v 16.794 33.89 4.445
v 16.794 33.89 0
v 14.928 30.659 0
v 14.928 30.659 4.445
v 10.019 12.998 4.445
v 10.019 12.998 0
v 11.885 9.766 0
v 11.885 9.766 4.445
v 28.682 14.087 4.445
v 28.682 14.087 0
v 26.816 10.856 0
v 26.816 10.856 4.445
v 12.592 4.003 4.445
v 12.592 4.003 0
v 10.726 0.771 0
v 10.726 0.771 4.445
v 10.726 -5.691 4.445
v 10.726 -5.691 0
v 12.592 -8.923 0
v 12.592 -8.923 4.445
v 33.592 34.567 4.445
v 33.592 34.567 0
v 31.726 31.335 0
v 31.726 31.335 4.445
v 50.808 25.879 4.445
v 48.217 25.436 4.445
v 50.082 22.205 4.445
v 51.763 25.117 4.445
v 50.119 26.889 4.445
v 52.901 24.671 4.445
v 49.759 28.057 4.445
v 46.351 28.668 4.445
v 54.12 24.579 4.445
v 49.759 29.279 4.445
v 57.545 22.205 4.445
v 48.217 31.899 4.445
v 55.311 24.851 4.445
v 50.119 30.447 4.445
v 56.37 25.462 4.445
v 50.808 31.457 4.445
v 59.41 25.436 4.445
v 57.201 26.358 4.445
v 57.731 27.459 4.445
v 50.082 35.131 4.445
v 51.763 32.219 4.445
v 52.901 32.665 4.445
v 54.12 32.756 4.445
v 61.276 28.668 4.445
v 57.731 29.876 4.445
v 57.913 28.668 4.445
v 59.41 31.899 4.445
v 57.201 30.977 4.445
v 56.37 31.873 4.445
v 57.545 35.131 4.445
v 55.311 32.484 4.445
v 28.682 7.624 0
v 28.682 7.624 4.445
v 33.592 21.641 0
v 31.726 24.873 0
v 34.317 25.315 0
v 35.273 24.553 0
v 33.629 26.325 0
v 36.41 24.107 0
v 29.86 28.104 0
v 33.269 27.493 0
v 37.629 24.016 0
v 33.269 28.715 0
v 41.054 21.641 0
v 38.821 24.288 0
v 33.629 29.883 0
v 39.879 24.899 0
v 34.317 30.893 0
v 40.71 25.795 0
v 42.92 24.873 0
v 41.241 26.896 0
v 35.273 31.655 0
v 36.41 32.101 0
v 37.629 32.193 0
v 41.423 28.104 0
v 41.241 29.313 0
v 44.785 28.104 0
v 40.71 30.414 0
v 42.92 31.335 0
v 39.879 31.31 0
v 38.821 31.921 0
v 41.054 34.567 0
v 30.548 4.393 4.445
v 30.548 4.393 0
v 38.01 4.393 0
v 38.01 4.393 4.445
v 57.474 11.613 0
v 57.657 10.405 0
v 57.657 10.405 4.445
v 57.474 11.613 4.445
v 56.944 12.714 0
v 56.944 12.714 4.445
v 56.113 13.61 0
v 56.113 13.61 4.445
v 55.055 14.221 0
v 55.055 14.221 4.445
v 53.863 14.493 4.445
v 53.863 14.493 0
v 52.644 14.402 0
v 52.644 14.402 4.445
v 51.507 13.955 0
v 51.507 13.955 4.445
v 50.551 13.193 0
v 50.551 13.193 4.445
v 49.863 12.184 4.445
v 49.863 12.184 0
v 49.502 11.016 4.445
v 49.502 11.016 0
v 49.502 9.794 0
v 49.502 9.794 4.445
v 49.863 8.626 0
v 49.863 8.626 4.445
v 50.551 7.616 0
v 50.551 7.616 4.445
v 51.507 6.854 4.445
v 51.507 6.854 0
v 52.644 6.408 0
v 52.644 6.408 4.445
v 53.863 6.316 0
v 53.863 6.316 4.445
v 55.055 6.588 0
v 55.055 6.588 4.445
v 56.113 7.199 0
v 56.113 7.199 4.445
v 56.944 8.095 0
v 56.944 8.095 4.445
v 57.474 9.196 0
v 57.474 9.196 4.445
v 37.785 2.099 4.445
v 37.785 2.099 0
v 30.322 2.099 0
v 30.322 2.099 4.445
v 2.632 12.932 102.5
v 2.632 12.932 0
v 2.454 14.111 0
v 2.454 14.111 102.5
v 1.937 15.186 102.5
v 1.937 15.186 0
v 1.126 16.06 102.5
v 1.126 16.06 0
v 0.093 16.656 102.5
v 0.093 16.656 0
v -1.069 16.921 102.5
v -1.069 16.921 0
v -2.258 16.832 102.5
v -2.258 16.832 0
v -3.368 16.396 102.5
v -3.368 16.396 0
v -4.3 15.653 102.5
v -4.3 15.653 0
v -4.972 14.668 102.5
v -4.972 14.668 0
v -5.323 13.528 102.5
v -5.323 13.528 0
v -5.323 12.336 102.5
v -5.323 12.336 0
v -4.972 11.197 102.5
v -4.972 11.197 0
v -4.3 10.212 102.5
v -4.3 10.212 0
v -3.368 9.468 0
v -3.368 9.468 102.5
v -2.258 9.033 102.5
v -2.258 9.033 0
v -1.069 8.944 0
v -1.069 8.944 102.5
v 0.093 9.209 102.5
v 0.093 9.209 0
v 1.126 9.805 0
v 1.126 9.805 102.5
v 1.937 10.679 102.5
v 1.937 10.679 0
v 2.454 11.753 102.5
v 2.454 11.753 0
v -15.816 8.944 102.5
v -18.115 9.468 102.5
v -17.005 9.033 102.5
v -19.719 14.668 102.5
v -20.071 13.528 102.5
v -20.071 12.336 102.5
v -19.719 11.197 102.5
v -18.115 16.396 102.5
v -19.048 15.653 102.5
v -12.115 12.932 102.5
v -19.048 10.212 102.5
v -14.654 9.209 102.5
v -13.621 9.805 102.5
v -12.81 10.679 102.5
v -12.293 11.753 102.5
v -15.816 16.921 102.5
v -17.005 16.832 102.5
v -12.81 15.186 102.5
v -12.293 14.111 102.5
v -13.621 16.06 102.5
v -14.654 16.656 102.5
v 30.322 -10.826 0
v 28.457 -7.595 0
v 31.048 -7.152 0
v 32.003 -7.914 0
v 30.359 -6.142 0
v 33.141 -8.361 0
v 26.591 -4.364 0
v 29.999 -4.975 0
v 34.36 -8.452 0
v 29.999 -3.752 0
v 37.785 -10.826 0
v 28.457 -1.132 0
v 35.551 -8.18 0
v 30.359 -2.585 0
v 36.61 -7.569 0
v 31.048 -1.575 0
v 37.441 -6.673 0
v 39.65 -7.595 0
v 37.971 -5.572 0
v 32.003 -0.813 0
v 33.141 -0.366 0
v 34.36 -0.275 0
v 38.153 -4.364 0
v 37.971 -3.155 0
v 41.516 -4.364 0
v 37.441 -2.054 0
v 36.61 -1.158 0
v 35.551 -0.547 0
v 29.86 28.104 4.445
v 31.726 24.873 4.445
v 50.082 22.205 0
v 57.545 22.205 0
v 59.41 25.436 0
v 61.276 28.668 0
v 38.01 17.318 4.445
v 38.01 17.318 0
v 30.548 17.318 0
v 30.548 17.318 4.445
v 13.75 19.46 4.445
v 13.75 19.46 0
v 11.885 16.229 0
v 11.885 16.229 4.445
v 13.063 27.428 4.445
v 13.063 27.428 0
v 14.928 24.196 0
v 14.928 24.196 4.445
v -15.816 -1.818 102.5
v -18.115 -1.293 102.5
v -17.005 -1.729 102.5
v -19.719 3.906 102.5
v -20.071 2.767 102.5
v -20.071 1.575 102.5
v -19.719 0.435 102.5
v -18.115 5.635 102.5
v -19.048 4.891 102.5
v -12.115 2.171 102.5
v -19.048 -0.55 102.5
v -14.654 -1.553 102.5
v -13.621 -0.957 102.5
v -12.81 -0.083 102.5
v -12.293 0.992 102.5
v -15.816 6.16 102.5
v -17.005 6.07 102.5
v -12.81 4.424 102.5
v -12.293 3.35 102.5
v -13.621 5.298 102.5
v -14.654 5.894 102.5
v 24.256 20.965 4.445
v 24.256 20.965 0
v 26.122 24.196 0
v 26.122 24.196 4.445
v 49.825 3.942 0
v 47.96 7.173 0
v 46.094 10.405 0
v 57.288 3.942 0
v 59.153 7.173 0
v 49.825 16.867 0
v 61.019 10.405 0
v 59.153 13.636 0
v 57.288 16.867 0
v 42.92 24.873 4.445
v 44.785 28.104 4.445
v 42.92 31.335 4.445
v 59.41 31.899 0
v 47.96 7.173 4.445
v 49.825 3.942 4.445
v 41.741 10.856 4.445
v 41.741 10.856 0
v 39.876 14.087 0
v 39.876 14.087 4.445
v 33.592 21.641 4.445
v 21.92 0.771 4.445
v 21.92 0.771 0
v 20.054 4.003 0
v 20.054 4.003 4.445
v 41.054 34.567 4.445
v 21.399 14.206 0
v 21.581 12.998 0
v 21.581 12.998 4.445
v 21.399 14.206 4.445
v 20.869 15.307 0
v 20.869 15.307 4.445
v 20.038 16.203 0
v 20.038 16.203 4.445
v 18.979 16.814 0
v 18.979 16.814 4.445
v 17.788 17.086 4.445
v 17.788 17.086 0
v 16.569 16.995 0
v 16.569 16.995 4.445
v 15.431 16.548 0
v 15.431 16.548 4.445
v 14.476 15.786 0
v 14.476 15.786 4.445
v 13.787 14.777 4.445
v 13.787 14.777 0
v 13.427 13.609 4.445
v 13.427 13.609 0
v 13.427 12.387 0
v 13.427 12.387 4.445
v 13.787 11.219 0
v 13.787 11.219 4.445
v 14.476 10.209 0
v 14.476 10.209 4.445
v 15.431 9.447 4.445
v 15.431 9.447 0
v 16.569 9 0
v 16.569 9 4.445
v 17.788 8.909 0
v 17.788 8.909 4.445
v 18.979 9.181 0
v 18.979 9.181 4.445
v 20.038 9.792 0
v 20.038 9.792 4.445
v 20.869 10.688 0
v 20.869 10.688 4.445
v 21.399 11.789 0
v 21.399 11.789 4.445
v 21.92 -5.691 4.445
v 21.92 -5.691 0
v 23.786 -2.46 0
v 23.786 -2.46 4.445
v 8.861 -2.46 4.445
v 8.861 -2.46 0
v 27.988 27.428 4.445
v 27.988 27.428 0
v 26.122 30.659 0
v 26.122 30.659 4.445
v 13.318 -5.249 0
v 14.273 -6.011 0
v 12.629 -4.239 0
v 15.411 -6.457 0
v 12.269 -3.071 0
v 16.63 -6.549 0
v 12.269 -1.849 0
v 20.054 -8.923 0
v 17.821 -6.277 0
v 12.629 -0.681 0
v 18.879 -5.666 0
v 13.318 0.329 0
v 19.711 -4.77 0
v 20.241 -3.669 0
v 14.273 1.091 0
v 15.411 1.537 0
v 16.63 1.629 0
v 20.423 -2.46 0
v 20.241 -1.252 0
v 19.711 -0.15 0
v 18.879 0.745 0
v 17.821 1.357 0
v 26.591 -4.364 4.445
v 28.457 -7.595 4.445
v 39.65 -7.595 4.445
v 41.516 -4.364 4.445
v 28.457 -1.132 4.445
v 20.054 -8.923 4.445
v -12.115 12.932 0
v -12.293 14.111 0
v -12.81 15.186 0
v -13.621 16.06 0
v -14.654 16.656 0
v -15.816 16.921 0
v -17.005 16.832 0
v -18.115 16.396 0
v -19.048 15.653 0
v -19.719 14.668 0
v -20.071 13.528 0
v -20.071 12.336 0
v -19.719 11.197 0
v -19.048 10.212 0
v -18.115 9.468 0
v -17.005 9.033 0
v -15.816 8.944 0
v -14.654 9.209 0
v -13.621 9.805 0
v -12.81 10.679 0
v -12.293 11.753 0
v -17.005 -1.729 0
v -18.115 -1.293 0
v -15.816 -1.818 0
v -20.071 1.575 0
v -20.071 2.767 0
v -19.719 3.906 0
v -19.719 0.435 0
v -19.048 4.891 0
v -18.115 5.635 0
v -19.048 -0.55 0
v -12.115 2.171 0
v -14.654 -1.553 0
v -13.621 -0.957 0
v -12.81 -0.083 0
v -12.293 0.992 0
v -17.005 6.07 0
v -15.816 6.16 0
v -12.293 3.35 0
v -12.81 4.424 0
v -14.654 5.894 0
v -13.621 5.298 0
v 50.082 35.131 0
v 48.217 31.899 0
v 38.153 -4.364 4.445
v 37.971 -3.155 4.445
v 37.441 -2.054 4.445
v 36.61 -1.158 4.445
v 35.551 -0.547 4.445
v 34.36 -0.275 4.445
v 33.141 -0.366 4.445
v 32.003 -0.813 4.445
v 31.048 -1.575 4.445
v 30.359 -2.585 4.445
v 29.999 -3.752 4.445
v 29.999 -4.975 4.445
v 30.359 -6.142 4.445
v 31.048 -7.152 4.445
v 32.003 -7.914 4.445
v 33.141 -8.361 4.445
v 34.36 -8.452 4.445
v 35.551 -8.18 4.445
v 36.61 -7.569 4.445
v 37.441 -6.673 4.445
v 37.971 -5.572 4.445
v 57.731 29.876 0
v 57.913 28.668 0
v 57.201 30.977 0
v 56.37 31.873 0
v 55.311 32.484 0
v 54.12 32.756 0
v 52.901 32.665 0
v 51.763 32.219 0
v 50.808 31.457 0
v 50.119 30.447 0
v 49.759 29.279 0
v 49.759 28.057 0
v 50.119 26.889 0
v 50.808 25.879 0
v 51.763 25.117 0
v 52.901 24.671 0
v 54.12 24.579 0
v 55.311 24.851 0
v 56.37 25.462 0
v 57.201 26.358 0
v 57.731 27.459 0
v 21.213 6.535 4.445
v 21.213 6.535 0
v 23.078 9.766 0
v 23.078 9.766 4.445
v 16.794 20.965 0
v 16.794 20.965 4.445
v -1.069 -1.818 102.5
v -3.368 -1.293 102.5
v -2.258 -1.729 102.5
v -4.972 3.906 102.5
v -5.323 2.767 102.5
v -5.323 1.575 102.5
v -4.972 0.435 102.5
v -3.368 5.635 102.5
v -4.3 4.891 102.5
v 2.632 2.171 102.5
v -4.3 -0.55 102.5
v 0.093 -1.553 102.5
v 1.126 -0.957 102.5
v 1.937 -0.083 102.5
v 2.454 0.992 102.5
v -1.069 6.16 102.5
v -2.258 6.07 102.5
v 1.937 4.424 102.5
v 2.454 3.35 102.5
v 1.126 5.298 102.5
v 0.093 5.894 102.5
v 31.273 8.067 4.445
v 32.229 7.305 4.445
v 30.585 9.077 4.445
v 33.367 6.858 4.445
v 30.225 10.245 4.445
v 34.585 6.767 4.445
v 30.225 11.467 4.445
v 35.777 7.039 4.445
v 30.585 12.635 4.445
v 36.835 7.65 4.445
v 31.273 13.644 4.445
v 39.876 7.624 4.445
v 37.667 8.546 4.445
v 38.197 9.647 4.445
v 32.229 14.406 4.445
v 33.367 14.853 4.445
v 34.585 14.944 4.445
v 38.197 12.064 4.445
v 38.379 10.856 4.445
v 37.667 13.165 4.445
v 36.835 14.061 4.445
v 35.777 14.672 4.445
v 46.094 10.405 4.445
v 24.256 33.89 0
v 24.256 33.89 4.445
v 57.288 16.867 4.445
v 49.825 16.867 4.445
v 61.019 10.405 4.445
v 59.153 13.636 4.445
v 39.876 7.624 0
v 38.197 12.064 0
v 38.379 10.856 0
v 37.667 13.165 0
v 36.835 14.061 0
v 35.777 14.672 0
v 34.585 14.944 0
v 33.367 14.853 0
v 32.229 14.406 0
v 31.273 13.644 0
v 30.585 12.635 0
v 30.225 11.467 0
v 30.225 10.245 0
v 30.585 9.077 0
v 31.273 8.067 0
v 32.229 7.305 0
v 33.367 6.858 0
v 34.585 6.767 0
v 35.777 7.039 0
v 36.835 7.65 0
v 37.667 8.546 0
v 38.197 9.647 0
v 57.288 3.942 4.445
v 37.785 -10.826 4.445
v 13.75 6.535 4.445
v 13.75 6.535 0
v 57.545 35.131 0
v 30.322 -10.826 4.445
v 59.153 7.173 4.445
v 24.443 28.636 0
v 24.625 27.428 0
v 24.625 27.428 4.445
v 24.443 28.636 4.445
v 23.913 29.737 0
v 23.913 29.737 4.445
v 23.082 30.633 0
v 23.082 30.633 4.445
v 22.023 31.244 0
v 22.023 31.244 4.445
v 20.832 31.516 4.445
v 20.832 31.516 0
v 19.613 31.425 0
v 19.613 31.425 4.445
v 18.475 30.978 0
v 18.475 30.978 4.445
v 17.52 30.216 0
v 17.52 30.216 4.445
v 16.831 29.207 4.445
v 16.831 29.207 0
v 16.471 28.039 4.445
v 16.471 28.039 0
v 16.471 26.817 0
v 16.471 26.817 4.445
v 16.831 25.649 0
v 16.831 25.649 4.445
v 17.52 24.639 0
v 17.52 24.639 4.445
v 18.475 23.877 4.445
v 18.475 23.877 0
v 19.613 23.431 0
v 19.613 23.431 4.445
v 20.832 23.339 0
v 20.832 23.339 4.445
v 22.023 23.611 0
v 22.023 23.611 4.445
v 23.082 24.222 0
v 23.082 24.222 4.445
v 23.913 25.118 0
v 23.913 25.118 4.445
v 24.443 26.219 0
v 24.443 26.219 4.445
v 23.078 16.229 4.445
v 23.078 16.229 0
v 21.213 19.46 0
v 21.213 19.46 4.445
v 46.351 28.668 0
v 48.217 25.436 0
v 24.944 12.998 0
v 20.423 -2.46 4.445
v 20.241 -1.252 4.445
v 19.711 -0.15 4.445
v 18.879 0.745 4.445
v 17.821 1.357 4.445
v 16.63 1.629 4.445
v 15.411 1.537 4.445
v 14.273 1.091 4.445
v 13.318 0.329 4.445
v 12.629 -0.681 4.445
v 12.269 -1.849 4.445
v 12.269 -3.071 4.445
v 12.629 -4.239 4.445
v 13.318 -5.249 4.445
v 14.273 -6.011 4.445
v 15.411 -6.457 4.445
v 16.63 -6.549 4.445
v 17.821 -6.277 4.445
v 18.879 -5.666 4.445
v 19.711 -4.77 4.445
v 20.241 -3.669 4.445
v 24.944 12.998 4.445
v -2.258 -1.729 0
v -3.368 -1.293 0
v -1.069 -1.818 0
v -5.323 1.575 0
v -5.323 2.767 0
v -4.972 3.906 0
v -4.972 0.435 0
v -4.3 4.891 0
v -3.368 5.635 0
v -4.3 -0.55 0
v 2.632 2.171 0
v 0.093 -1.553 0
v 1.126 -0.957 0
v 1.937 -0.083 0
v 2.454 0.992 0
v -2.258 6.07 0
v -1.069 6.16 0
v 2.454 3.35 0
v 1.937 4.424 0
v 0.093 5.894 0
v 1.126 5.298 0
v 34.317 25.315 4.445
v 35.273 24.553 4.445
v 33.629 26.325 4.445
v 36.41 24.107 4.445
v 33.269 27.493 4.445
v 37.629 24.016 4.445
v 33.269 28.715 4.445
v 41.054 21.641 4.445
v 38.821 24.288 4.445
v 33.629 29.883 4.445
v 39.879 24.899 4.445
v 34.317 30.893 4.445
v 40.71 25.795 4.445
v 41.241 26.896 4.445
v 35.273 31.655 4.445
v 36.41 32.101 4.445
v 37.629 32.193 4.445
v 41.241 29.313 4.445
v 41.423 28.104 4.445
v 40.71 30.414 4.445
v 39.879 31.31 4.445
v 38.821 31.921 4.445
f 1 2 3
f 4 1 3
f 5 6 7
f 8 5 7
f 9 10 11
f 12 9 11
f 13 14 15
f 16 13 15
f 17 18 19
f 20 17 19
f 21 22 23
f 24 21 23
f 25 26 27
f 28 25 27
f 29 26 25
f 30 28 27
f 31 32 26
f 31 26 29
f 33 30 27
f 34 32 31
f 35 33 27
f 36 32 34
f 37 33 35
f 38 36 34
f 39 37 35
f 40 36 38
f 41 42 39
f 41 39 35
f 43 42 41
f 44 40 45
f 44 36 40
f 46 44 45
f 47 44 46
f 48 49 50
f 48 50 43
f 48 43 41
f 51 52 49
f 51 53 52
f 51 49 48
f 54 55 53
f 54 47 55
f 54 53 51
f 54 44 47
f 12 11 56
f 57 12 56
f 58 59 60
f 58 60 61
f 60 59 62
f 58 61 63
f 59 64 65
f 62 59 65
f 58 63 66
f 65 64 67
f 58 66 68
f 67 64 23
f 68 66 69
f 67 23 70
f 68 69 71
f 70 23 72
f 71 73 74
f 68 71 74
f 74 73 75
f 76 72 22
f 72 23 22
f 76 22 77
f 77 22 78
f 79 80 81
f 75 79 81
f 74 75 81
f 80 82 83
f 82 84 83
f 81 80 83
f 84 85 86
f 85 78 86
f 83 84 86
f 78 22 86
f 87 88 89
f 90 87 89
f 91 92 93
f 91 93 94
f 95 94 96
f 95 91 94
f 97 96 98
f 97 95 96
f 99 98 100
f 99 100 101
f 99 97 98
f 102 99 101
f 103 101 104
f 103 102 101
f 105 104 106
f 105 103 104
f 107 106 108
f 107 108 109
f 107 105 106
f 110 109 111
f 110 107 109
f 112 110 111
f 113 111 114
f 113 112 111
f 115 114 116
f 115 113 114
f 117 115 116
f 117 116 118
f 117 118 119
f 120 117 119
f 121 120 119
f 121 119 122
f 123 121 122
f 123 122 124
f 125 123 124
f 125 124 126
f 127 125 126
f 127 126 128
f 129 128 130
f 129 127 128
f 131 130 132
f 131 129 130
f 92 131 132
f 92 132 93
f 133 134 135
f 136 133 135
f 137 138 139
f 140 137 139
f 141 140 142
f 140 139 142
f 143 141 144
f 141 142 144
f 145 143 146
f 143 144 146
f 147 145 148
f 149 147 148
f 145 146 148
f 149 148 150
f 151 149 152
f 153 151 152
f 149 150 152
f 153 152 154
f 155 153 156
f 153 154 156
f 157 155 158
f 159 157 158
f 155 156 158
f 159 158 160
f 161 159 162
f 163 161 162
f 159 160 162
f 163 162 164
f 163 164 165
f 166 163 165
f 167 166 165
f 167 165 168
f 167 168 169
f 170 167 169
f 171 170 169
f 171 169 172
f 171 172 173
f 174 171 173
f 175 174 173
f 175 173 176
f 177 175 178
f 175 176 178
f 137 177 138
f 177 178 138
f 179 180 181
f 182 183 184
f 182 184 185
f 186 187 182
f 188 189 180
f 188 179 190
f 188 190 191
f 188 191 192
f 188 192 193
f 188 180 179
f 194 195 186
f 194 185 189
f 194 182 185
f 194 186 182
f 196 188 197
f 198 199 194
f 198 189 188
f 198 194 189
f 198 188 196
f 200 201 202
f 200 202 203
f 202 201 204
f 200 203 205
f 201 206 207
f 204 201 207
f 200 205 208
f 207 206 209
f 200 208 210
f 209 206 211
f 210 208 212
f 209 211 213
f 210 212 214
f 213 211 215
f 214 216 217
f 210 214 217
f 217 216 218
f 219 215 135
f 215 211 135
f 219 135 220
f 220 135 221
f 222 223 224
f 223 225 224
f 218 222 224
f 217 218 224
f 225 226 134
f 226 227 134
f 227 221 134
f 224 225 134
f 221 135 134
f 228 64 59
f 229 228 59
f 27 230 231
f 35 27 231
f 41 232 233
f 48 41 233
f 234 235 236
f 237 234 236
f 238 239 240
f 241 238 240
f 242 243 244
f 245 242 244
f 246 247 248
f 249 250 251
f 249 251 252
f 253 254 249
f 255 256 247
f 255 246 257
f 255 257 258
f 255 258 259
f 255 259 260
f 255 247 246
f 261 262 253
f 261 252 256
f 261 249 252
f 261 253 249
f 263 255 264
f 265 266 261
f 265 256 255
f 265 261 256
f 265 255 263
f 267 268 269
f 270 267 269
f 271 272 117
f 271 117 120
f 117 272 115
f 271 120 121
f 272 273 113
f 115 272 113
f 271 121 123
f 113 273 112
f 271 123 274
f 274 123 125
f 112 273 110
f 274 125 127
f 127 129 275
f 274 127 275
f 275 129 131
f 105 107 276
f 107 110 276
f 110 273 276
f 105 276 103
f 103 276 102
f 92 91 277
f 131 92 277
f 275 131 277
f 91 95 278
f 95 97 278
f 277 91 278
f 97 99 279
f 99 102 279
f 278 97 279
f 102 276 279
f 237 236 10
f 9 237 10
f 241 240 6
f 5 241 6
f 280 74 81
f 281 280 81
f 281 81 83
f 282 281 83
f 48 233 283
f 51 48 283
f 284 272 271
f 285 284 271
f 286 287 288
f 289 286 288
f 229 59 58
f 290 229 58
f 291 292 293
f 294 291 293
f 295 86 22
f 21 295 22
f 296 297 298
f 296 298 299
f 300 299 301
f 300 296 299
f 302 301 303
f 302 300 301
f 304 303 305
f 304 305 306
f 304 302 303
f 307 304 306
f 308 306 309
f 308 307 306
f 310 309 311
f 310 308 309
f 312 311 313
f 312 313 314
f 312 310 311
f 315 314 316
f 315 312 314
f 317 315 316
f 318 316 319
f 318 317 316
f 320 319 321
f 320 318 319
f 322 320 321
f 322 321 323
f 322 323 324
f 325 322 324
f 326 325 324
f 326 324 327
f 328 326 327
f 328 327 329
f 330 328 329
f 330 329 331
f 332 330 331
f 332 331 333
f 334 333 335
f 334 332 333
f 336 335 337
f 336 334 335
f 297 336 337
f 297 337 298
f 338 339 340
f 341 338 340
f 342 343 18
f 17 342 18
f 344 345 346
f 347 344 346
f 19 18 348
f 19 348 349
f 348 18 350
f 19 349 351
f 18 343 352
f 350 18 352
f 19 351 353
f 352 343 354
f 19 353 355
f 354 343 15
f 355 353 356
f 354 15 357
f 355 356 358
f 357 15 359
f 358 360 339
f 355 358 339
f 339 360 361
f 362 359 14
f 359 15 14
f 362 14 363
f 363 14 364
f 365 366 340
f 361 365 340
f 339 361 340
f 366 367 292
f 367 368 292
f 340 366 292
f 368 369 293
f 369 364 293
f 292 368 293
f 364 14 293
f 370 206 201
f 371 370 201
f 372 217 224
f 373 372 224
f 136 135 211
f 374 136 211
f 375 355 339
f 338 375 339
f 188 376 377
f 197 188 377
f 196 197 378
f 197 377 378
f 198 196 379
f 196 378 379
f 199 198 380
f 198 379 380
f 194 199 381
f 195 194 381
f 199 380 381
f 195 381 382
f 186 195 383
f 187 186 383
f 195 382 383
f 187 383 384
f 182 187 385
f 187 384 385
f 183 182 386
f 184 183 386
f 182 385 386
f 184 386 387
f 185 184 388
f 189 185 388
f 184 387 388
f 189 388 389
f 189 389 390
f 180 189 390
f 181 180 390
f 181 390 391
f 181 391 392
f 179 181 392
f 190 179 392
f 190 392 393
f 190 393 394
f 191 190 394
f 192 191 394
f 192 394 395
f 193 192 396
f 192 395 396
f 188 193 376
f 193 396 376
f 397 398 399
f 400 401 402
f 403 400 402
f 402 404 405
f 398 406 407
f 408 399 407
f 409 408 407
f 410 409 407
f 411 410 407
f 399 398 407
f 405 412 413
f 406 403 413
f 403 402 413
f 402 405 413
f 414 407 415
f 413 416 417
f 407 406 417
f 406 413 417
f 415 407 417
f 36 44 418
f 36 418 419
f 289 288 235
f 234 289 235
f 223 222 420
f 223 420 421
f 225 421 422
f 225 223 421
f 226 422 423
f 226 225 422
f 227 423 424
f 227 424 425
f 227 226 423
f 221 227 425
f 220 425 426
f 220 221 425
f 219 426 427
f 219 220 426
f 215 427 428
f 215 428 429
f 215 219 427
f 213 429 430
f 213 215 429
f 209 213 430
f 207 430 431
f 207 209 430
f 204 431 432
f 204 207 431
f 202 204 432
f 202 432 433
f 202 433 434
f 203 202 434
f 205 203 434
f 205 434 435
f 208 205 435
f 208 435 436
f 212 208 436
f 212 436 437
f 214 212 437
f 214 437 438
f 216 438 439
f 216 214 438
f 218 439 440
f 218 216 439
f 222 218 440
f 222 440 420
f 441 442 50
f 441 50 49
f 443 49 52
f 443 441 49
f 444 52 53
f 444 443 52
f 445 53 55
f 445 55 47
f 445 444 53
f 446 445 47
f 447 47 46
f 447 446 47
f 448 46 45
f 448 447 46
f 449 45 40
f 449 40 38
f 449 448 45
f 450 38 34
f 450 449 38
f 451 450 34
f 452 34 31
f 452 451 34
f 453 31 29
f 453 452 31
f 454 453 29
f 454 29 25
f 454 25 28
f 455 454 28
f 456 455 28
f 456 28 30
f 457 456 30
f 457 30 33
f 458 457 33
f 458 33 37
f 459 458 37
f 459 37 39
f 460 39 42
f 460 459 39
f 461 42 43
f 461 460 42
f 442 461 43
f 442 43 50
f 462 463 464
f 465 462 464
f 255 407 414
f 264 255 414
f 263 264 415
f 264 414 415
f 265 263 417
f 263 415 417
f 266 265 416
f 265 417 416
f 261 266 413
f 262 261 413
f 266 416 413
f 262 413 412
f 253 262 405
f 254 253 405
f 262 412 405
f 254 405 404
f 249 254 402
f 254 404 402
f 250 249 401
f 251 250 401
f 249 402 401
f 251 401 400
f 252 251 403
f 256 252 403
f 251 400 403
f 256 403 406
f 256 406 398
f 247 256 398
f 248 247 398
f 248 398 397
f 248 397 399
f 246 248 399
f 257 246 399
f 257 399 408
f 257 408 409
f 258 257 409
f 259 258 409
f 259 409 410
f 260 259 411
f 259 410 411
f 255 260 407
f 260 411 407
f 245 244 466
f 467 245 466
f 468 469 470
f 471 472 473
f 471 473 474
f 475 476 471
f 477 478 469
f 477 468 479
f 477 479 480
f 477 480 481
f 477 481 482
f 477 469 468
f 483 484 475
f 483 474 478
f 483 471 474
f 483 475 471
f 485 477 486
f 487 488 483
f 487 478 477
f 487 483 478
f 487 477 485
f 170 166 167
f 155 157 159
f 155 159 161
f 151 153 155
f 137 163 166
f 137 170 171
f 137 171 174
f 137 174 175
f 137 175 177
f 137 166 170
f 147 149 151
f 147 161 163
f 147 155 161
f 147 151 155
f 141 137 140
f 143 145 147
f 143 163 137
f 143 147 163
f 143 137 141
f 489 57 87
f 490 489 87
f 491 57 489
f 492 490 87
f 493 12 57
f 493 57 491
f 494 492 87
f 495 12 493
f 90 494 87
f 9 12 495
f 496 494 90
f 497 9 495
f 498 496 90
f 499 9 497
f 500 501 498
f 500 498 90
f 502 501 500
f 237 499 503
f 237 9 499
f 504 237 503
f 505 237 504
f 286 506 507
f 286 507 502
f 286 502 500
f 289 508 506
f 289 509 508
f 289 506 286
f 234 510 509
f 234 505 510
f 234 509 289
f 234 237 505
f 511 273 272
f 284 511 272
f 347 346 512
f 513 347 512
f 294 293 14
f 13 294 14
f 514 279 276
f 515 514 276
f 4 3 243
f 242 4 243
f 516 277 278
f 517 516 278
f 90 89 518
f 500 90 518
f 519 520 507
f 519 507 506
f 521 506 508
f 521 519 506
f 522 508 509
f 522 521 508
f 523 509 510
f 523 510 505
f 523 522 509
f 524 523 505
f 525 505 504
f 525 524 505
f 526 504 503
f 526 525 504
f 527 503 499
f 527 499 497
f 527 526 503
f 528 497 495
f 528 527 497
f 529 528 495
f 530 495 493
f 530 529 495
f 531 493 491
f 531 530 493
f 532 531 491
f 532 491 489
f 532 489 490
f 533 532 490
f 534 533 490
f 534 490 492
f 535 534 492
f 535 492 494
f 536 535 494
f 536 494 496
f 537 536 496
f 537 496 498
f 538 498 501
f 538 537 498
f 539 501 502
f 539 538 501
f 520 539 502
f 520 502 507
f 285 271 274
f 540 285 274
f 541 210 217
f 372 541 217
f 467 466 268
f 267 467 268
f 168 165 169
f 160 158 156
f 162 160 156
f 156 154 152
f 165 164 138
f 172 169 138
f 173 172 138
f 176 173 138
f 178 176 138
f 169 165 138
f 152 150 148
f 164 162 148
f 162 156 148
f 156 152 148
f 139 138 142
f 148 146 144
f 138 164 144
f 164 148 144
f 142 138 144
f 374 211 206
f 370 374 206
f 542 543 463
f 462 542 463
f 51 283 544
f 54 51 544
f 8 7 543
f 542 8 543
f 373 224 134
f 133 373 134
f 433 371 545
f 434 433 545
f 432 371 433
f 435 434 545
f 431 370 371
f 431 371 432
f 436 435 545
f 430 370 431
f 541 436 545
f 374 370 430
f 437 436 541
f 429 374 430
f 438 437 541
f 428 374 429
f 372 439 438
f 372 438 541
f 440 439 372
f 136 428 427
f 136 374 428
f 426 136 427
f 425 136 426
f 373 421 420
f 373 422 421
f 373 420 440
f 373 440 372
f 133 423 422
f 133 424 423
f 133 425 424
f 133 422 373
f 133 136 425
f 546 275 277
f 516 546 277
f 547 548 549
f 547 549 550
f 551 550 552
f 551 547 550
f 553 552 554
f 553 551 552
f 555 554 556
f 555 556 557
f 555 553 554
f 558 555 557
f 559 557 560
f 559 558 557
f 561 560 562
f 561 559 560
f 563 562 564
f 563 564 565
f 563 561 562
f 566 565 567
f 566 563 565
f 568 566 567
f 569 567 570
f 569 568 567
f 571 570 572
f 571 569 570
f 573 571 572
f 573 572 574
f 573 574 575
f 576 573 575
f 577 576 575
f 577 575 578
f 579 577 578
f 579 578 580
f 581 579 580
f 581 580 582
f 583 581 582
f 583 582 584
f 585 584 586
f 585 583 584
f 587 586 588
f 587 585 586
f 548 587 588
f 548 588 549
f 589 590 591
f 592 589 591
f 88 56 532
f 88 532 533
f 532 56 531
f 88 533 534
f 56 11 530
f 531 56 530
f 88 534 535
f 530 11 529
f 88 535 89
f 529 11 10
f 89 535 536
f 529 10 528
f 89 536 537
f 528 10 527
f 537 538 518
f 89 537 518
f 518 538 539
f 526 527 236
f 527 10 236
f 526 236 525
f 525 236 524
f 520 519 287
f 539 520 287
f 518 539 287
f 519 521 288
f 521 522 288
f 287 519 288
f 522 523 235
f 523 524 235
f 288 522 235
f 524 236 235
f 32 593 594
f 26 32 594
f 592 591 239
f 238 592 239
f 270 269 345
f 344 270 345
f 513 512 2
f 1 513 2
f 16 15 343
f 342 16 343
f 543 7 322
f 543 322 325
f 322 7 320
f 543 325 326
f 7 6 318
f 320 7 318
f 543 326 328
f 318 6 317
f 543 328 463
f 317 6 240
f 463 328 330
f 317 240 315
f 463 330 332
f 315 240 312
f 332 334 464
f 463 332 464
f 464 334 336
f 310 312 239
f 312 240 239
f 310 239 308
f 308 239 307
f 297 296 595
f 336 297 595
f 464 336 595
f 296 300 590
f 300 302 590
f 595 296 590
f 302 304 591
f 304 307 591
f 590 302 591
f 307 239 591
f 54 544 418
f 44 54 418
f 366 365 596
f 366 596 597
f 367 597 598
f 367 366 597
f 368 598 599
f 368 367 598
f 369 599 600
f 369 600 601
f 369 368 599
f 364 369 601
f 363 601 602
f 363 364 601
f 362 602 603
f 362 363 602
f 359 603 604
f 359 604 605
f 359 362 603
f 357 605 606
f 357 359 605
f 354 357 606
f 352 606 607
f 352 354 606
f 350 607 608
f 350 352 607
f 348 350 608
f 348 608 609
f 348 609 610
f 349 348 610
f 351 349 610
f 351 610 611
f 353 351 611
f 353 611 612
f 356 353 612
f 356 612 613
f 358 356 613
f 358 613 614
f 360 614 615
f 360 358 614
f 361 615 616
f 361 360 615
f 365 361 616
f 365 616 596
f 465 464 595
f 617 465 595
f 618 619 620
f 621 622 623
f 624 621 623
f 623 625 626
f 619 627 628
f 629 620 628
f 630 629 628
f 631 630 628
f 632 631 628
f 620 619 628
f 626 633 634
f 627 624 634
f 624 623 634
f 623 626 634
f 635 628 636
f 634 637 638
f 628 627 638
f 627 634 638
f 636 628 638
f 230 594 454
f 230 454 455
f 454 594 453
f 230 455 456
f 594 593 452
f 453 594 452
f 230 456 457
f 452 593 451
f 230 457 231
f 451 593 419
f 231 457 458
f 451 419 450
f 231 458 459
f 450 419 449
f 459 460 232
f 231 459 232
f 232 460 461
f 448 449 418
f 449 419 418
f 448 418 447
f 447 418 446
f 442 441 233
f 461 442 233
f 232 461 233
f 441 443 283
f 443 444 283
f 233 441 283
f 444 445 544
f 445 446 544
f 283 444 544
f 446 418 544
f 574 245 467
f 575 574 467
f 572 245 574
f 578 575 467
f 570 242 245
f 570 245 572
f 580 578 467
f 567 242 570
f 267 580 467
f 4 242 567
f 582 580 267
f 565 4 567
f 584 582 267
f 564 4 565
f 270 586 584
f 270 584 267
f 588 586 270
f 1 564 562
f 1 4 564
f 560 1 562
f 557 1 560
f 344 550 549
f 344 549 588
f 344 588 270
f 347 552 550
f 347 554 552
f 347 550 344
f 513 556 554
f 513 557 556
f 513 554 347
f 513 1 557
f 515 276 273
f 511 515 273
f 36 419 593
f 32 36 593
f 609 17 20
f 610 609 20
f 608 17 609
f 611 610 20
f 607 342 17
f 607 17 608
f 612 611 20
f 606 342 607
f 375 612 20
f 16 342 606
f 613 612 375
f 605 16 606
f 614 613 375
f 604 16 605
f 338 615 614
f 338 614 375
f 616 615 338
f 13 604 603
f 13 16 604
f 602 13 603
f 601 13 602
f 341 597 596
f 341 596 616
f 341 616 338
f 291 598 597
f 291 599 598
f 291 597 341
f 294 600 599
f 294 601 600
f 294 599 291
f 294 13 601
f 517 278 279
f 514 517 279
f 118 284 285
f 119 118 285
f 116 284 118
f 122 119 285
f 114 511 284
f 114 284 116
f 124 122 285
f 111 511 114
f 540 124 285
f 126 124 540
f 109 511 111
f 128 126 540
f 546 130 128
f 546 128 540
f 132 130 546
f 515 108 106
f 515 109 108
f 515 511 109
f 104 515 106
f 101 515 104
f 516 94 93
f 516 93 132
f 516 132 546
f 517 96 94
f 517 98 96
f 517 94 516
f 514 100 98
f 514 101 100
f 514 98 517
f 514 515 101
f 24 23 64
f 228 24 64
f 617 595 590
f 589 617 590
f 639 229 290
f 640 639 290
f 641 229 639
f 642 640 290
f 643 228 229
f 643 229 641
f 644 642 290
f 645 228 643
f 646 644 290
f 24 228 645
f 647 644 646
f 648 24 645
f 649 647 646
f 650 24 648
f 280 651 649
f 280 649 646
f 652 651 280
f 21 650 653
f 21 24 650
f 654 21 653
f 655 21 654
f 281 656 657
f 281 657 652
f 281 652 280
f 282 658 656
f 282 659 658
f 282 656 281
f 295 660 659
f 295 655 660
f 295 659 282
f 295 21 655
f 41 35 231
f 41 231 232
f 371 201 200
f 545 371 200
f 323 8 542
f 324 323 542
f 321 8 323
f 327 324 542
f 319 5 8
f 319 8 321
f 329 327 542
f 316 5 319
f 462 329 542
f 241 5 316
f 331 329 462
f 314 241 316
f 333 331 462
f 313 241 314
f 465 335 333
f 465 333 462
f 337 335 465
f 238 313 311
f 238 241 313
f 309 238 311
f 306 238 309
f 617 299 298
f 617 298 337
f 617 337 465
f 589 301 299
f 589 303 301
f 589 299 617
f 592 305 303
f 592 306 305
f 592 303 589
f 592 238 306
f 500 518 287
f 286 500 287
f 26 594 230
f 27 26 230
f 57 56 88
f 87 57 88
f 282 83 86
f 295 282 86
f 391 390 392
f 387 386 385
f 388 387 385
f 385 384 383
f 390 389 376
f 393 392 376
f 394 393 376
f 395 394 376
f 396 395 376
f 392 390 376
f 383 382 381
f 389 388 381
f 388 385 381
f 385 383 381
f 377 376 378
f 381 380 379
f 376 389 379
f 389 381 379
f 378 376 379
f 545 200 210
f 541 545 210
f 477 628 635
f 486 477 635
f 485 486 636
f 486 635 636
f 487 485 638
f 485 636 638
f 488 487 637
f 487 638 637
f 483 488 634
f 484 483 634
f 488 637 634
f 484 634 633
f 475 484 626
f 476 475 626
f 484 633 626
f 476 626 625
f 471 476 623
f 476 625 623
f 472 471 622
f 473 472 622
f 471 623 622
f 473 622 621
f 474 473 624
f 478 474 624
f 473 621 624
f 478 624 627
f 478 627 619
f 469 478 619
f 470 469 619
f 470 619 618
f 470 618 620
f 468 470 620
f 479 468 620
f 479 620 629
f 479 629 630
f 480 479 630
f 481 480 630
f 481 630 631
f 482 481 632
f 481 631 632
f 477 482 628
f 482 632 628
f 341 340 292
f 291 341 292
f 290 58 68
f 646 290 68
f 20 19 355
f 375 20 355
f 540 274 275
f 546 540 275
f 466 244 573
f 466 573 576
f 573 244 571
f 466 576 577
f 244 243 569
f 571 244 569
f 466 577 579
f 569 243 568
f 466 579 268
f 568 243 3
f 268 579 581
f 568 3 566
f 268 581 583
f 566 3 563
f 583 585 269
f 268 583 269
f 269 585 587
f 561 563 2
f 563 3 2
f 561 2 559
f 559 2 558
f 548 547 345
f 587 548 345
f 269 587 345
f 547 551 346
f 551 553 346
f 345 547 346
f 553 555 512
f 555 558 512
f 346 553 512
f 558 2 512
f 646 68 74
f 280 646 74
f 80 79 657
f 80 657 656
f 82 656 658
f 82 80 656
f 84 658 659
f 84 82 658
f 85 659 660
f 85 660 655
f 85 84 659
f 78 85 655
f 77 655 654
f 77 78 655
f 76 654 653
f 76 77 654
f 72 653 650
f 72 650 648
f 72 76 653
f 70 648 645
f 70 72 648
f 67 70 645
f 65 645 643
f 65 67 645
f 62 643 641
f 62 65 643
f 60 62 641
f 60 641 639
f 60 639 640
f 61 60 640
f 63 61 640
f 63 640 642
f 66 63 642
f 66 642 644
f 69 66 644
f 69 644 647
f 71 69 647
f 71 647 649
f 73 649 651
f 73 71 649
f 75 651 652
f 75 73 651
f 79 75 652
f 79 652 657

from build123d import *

# Parameters (mm, degrees)
F0_R     = 4
F1_DEPTH = 102.5
F2_R     = 4.1
F3_DEPTH = 4.445


with BuildPart() as f1:
    # F0 (on Top) → F1 (new body)
    with BuildSketch(Plane.XY):
        with Locations((-16.1153431982, 12.9323182628)):
            Circle(F0_R)
    extrude(amount=F1_DEPTH)


with BuildPart() as f1b:
    # F0 (on Top) → F1, piece 2 (new body)
    with BuildSketch(Plane.XY):
        with Locations((-1.3679224066, 12.9323182628)):
            Circle(F0_R)
    extrude(amount=F1_DEPTH)


with BuildPart() as f1c:
    # F0 (on Top) → F1, piece 3 (new body)
    with BuildSketch(Plane.XY):
        with Locations((-1.3679224066, 2.1706875414)):
            Circle(F0_R)
    extrude(amount=F1_DEPTH)


with BuildPart() as f1d:
    # F0 (on Top) → F1, piece 4 (new body)
    with BuildSketch(Plane.XY):
        with Locations((-16.1153431982, 2.1706875414)):
            Circle(F0_R)
    extrude(amount=F1_DEPTH)


with BuildPart() as f3:
    # F2 (on Top) → F3 (new body)
    with BuildSketch(Plane.XY):
        with BuildLine():
            ThreePointArc((26.1220804673, 24.1964040249), (26.7677051282, 25.7550798197), (26.987915677, 27.4277449835))
            ThreePointArc((26.987915677, 27.4277449835), (26.7677051517, 29.1004100597), (26.1220805581, 30.6590857849))
            ThreePointArc((26.1220805581, 30.6590857849), (23.7565748121, 33.0245916115), (20.5252338201, 33.8904268404))
            ThreePointArc((20.5252338201, 33.8904268404), (17.2938930039, 33.024591713), (14.9283872851, 30.6590861366))
            ThreePointArc((14.9283872851, 30.6590861366), (14.0625519632, 27.4277451866), (14.9283870821, 24.1964041822))
            ThreePointArc((14.9283870821, 24.1964041822), (17.2938928281, 21.8308983556), (20.5252338201, 20.9650631266))
            ThreePointArc((20.5252338201, 20.9650631266), (23.7565747334, 21.8308983102), (26.1220804673, 24.1964040249))
        make_face()
        with Locations((20.5252338201, 27.4277449835)):
            Circle(F2_R, mode=Mode.SUBTRACT)
        with BuildLine():
            Line((24.2564649298, 20.9650631266), (26.1220804673, 24.1964040249))
            ThreePointArc((26.1220804673, 24.1964040249), (23.7565747334, 21.8308983102), (20.5252338201, 20.9650631266))
            Line((20.5252338201, 20.9650631266), (24.2564649298, 20.9650631266))
        make_face()
        with BuildLine():
            ThreePointArc((26.1220805581, 30.6590857849), (26.7677051517, 29.1004100597), (26.987915677, 27.4277449835))
            ThreePointArc((26.987915677, 27.4277449835), (26.7677051282, 25.7550798197), (26.1220804673, 24.1964040249))
            Line((26.1220804673, 24.1964040249), (27.9876960396, 27.4277449835))
            Line((27.9876960396, 27.4277449835), (26.1220805581, 30.6590857849))
        make_face()
        with BuildLine():
            ThreePointArc((20.5252338201, 33.8904268404), (23.7565748121, 33.0245916115), (26.1220805581, 30.6590857849))
            Line((26.1220805581, 30.6590857849), (24.2564649298, 33.8904268404))
            Line((24.2564649298, 33.8904268404), (20.5252338201, 33.8904268404))
        make_face()
        with BuildLine():
            ThreePointArc((14.9283872851, 30.6590861366), (17.2938930039, 33.024591713), (20.5252338201, 33.8904268404))
            Line((20.5252338201, 33.8904268404), (16.7940027103, 33.8904268404))
            Line((16.7940027103, 33.8904268404), (14.9283872851, 30.6590861366))
        make_face()
        with BuildLine():
            ThreePointArc((14.9283870821, 24.1964041822), (14.0625519632, 27.4277451866), (14.9283872851, 30.6590861366))
            Line((14.9283872851, 30.6590861366), (13.0627716006, 27.4277449835))
            Line((13.0627716006, 27.4277449835), (14.9283870821, 24.1964041822))
        make_face()
        with BuildLine():
            Line((16.7940027103, 20.9650631266), (20.5252338201, 20.9650631266))
            ThreePointArc((20.5252338201, 20.9650631266), (17.2938928281, 21.8308983556), (14.9283870821, 24.1964041822))
            Line((14.9283870821, 24.1964041822), (16.7940027103, 20.9650631266))
        make_face()
    extrude(amount=F3_DEPTH)


with BuildPart() as f3b:
    # F2 (on Top) → F3, piece 2 (new body)
    with BuildSketch(Plane.XY):
        with BuildLine():
            ThreePointArc((23.0782314461, 9.7663067206), (23.723856107, 11.3249825154), (23.9440666558, 12.9976476792))
            ThreePointArc((23.9440666558, 12.9976476792), (23.723856107, 14.6703128431), (23.0782314461, 16.2289886379))
            ThreePointArc((23.0782314461, 16.2289886379), (20.7127257122, 18.5944943526), (17.4813847989, 19.4603295361))
            ThreePointArc((17.4813847989, 19.4603295361), (14.2500439642, 18.594494398), (11.8845382425, 16.2289887952))
            ThreePointArc((11.8845382425, 16.2289887952), (11.018702942, 12.99764777), (11.8845381517, 9.7663067206))
            ThreePointArc((11.8845381517, 9.7663067206), (14.2500438855, 7.4008010059), (17.4813847989, 6.5349658224))
            ThreePointArc((17.4813847989, 6.5349658224), (20.7127257122, 7.4008010059), (23.0782314461, 9.7663067206))
        make_face()
        with Locations((17.4813847989, 12.9976476792)):
            Circle(F2_R, mode=Mode.SUBTRACT)
        with BuildLine():
            ThreePointArc((17.4813847989, 19.4603295361), (20.7127257122, 18.5944943526), (23.0782314461, 16.2289886379))
            Line((23.0782314461, 16.2289886379), (21.2126159086, 19.4603295361))
            Line((21.2126159086, 19.4603295361), (17.4813847989, 19.4603295361))
        make_face()
        with BuildLine():
            ThreePointArc((23.0782314461, 16.2289886379), (23.723856107, 14.6703128431), (23.9440666558, 12.9976476792))
            ThreePointArc((23.9440666558, 12.9976476792), (23.723856107, 11.3249825154), (23.0782314461, 9.7663067206))
            Line((23.0782314461, 9.7663067206), (24.9438470184, 12.9976476792))
            Line((24.9438470184, 12.9976476792), (23.0782314461, 16.2289886379))
        make_face()
        with BuildLine():
            Line((21.2126159086, 6.5349658224), (23.0782314461, 9.7663067206))
            ThreePointArc((23.0782314461, 9.7663067206), (20.7127257122, 7.4008010059), (17.4813847989, 6.5349658224))
            Line((17.4813847989, 6.5349658224), (21.2126159086, 6.5349658224))
        make_face()
        with BuildLine():
            Line((13.7501536891, 6.5349658224), (17.4813847989, 6.5349658224))
            ThreePointArc((17.4813847989, 6.5349658224), (14.2500438855, 7.4008010059), (11.8845381517, 9.7663067206))
            Line((11.8845381517, 9.7663067206), (13.7501536891, 6.5349658224))
        make_face()
        with BuildLine():
            ThreePointArc((11.8845381517, 9.7663067206), (11.018702942, 12.99764777), (11.8845382425, 16.2289887952))
            Line((11.8845382425, 16.2289887952), (10.0189225794, 12.9976476792))
            Line((10.0189225794, 12.9976476792), (11.8845381517, 9.7663067206))
        make_face()
        with BuildLine():
            ThreePointArc((11.8845382425, 16.2289887952), (14.2500439642, 18.594494398), (17.4813847989, 19.4603295361))
            Line((17.4813847989, 19.4603295361), (13.7501536891, 19.4603295361))
            Line((13.7501536891, 19.4603295361), (11.8845382425, 16.2289887952))
        make_face()
    extrude(amount=F3_DEPTH)


with BuildPart() as f3c:
    # F2 (on Top) → F3, piece 3 (new body)
    with BuildSketch(Plane.XY):
        with BuildLine():
            ThreePointArc((31.7259205786, 31.335498332), (34.0914262928, 33.7010038657), (37.3227670789, 34.5668389758))
            Line((37.3227670789, 34.5668389758), (33.5915359691, 34.5668389758))
            Line((33.5915359691, 34.5668389758), (31.7259205786, 31.335498332))
        make_face()
        with BuildLine():
            ThreePointArc((42.9196138169, 24.8728163175), (43.5652384105, 26.4314920428), (43.7854489358, 28.1041571189))
            ThreePointArc((43.7854489358, 28.1041571189), (43.565238349, 29.7768224246), (42.9196135792, 31.335498332))
            ThreePointArc((42.9196135792, 31.335498332), (40.554107865, 33.7010038657), (37.3227670789, 34.5668389758))
            ThreePointArc((37.3227670789, 34.5668389758), (34.0914262928, 33.7010038657), (31.7259205786, 31.335498332))
            ThreePointArc((31.7259205786, 31.335498332), (30.860085222, 28.1041574127), (31.7259202848, 24.8728164147))
            ThreePointArc((31.7259202848, 24.8728164147), (34.0914260383, 22.507310519), (37.3227670789, 21.641475262))
            ThreePointArc((37.3227670789, 21.641475262), (40.5541080709, 22.5073104909), (42.9196138169, 24.8728163175))
        make_face()
        with Locations((37.3227670789, 28.1041571189)):
            Circle(F2_R, mode=Mode.SUBTRACT)
        with BuildLine():
            ThreePointArc((31.7259202848, 24.8728164147), (30.860085222, 28.1041574127), (31.7259205786, 31.335498332))
            Line((31.7259205786, 31.335498332), (29.8603048593, 28.1041571189))
            Line((29.8603048593, 28.1041571189), (31.7259202848, 24.8728164147))
        make_face()
        with BuildLine():
            Line((33.5915359691, 21.641475262), (37.3227670789, 21.641475262))
            ThreePointArc((37.3227670789, 21.641475262), (34.0914260383, 22.507310519), (31.7259202848, 24.8728164147))
            Line((31.7259202848, 24.8728164147), (33.5915359691, 21.641475262))
        make_face()
        with BuildLine():
            Line((41.0539981886, 21.641475262), (42.9196138169, 24.8728163175))
            ThreePointArc((42.9196138169, 24.8728163175), (40.5541080709, 22.5073104909), (37.3227670789, 21.641475262))
            Line((37.3227670789, 21.641475262), (41.0539981886, 21.641475262))
        make_face()
        with BuildLine():
            ThreePointArc((42.9196135792, 31.335498332), (43.565238349, 29.7768224246), (43.7854489358, 28.1041571189))
            ThreePointArc((43.7854489358, 28.1041571189), (43.5652384105, 26.4314920428), (42.9196138169, 24.8728163175))
            Line((42.9196138169, 24.8728163175), (44.7852292984, 28.1041571189))
            Line((44.7852292984, 28.1041571189), (42.9196135792, 31.335498332))
        make_face()
        with BuildLine():
            ThreePointArc((37.3227670789, 34.5668389758), (40.554107865, 33.7010038657), (42.9196135792, 31.335498332))
            Line((42.9196135792, 31.335498332), (41.0539981886, 34.5668389758))
            Line((41.0539981886, 34.5668389758), (37.3227670789, 34.5668389758))
        make_face()
    extrude(amount=F3_DEPTH)


with BuildPart() as f3d:
    # F2 (on Top) → F3, piece 4 (new body)
    with BuildSketch(Plane.XY):
        with BuildLine():
            ThreePointArc((48.2165540826, 31.8991746875), (50.5820597968, 34.2646802212), (53.8134005829, 35.1305153313))
            Line((53.8134005829, 35.1305153313), (50.0821694732, 35.1305153313))
            Line((50.0821694732, 35.1305153313), (48.2165540826, 31.8991746875))
        make_face()
        with BuildLine():
            ThreePointArc((59.4102472352, 25.4364925245), (60.0558718924, 26.9951683155), (60.2760824398, 28.6678334744))
            ThreePointArc((60.2760824398, 28.6678334744), (60.0558718911, 30.3404986383), (59.4102472301, 31.8991744331))
            ThreePointArc((59.4102472301, 31.8991744331), (57.0447414963, 34.2646801478), (53.8134005829, 35.1305153313))
            ThreePointArc((53.8134005829, 35.1305153313), (50.5820597968, 34.2646802212), (48.2165540826, 31.8991746875))
            ThreePointArc((48.2165540826, 31.8991746875), (47.350718726, 28.6678336213), (48.2165539357, 25.4364925158))
            ThreePointArc((48.2165539357, 25.4364925158), (50.5820596696, 23.0709868011), (53.8134005829, 22.2051516175))
            ThreePointArc((53.8134005829, 22.2051516175), (57.0447415007, 23.0709868036), (59.4102472352, 25.4364925245))
        make_face()
        with Locations((53.8134005829, 28.6678334744)):
            Circle(F2_R, mode=Mode.SUBTRACT)
        with BuildLine():
            ThreePointArc((48.2165539357, 25.4364925158), (47.350718726, 28.6678336213), (48.2165540826, 31.8991746875))
            Line((48.2165540826, 31.8991746875), (46.3509383634, 28.6678334744))
            Line((46.3509383634, 28.6678334744), (48.2165539357, 25.4364925158))
        make_face()
        with BuildLine():
            Line((50.0821694732, 22.2051516175), (53.8134005829, 22.2051516175))
            ThreePointArc((53.8134005829, 22.2051516175), (50.5820596696, 23.0709868011), (48.2165539357, 25.4364925158))
            Line((48.2165539357, 25.4364925158), (50.0821694732, 22.2051516175))
        make_face()
        with BuildLine():
            Line((57.5446316927, 22.2051516175), (59.4102472352, 25.4364925245))
            ThreePointArc((59.4102472352, 25.4364925245), (57.0447415007, 23.0709868036), (53.8134005829, 22.2051516175))
            Line((53.8134005829, 22.2051516175), (57.5446316927, 22.2051516175))
        make_face()
        with BuildLine():
            ThreePointArc((59.4102472301, 31.8991744331), (60.0558718911, 30.3404986383), (60.2760824398, 28.6678334744))
            ThreePointArc((60.2760824398, 28.6678334744), (60.0558718924, 26.9951683155), (59.4102472352, 25.4364925245))
            Line((59.4102472352, 25.4364925245), (61.2758628025, 28.6678334744))
            Line((61.2758628025, 28.6678334744), (59.4102472301, 31.8991744331))
        make_face()
        with BuildLine():
            ThreePointArc((53.8134005829, 35.1305153313), (57.0447414963, 34.2646801478), (59.4102472301, 31.8991744331))
            Line((59.4102472301, 31.8991744331), (57.5446316927, 35.1305153313))
            Line((57.5446316927, 35.1305153313), (53.8134005829, 35.1305153313))
        make_face()
    extrude(amount=F3_DEPTH)


with BuildPart() as f3e:
    # F2 (on Top) → F3, piece 5 (new body)
    with BuildSketch(Plane.XY):
        with BuildLine():
            ThreePointArc((59.1534789324, 7.1733985622), (59.7991035677, 8.7320743304), (60.0193141074, 10.4047394607))
            ThreePointArc((60.0193141074, 10.4047394607), (59.7991035587, 12.0774046246), (59.1534788978, 13.6360804194))
            ThreePointArc((59.1534788978, 13.6360804194), (56.7879731639, 16.0015861341), (53.5566322505, 16.8674213176))
            ThreePointArc((53.5566322505, 16.8674213176), (50.3252914644, 16.0015862076), (47.9597857503, 13.6360806739))
            ThreePointArc((47.9597857503, 13.6360806739), (47.0939503937, 10.4047396077), (47.9597856033, 7.1733985021))
            ThreePointArc((47.9597856033, 7.1733985021), (50.3252913372, 4.8078927874), (53.5566322505, 3.9420576039))
            ThreePointArc((53.5566322505, 3.9420576039), (56.7879731939, 4.8078928047), (59.1534789324, 7.1733985622))
        make_face()
        with Locations((53.5566322505, 10.4047394607)):
            Circle(F2_R, mode=Mode.SUBTRACT)
        with BuildLine():
            ThreePointArc((47.9597857503, 13.6360806739), (50.3252914644, 16.0015862076), (53.5566322505, 16.8674213176))
            Line((53.5566322505, 16.8674213176), (49.8254011408, 16.8674213176))
            Line((49.8254011408, 16.8674213176), (47.9597857503, 13.6360806739))
        make_face()
        with BuildLine():
            ThreePointArc((47.9597856033, 7.1733985021), (47.0939503937, 10.4047396077), (47.9597857503, 13.6360806739))
            Line((47.9597857503, 13.6360806739), (46.094170031, 10.4047394607))
            Line((46.094170031, 10.4047394607), (47.9597856033, 7.1733985021))
        make_face()
        with BuildLine():
            Line((49.8254011408, 3.9420576039), (53.5566322505, 3.9420576039))
            ThreePointArc((53.5566322505, 3.9420576039), (50.3252913372, 4.8078927874), (47.9597856033, 7.1733985021))
            Line((47.9597856033, 7.1733985021), (49.8254011408, 3.9420576039))
        make_face()
        with BuildLine():
            Line((57.2878633603, 3.9420576039), (59.1534789324, 7.1733985622))
            ThreePointArc((59.1534789324, 7.1733985622), (56.7879731939, 4.8078928047), (53.5566322505, 3.9420576039))
            Line((53.5566322505, 3.9420576039), (57.2878633603, 3.9420576039))
        make_face()
        with BuildLine():
            ThreePointArc((59.1534788978, 13.6360804194), (59.7991035587, 12.0774046246), (60.0193141074, 10.4047394607))
            ThreePointArc((60.0193141074, 10.4047394607), (59.7991035677, 8.7320743304), (59.1534789324, 7.1733985622))
            Line((59.1534789324, 7.1733985622), (61.0190944701, 10.4047394607))
            Line((61.0190944701, 10.4047394607), (59.1534788978, 13.6360804194))
        make_face()
        with BuildLine():
            ThreePointArc((53.5566322505, 16.8674213176), (56.7879731639, 16.0015861341), (59.1534788978, 13.6360804194))
            Line((59.1534788978, 13.6360804194), (57.2878633603, 16.8674213176))
            Line((57.2878633603, 16.8674213176), (53.5566322505, 16.8674213176))
        make_face()
    extrude(amount=F3_DEPTH)


with BuildPart() as f3f:
    # F2 (on Top) → F3, piece 6 (new body)
    with BuildSketch(Plane.XY):
        with BuildLine():
            ThreePointArc((39.8757683179, 7.6243381791), (40.5213930621, 9.1830140599), (40.7416036399, 10.8556793321))
            ThreePointArc((40.7416036399, 10.8556793321), (40.5213930911, 12.528344496), (39.8757684302, 14.0870202908))
            ThreePointArc((39.8757684302, 14.0870202908), (37.5102626963, 16.4525260055), (34.278921783, 17.318361189))
            ThreePointArc((34.278921783, 17.318361189), (31.047580791, 16.4525259601), (28.682075045, 14.0870201335))
            ThreePointArc((28.682075045, 14.0870201335), (27.8162399261, 10.8556792974), (28.6820750796, 7.6243384707))
            ThreePointArc((28.6820750796, 7.6243384707), (31.047580821, 5.2588326868), (34.278921783, 4.3929974752))
            ThreePointArc((34.278921783, 4.3929974752), (37.5102625991, 5.2588326026), (39.8757683179, 7.6243381791))
        make_face()
        with Locations((34.278921783, 10.8556793321)):
            Circle(F2_R, mode=Mode.SUBTRACT)
        with BuildLine():
            ThreePointArc((28.682075045, 14.0870201335), (31.047580791, 16.4525259601), (34.278921783, 17.318361189))
            Line((34.278921783, 17.318361189), (30.5476906732, 17.318361189))
            Line((30.5476906732, 17.318361189), (28.682075045, 14.0870201335))
        make_face()
        with BuildLine():
            ThreePointArc((28.6820750796, 7.6243384707), (27.8162399261, 10.8556792974), (28.682075045, 14.0870201335))
            Line((28.682075045, 14.0870201335), (26.8164595634, 10.8556793321))
            Line((26.8164595634, 10.8556793321), (28.6820750796, 7.6243384707))
        make_face()
        with BuildLine():
            Line((30.5476906732, 4.3929974752), (34.278921783, 4.3929974752))
            ThreePointArc((34.278921783, 4.3929974752), (31.047580821, 5.2588326868), (28.6820750796, 7.6243384707))
            Line((28.6820750796, 7.6243384707), (30.5476906732, 4.3929974752))
        make_face()
        with BuildLine():
            Line((38.0101528927, 4.3929974752), (39.8757683179, 7.6243381791))
            ThreePointArc((39.8757683179, 7.6243381791), (37.5102625991, 5.2588326026), (34.278921783, 4.3929974752))
            Line((34.278921783, 4.3929974752), (38.0101528927, 4.3929974752))
        make_face()
        with BuildLine():
            ThreePointArc((39.8757684302, 14.0870202908), (40.5213930911, 12.528344496), (40.7416036399, 10.8556793321))
            ThreePointArc((40.7416036399, 10.8556793321), (40.5213930621, 9.1830140599), (39.8757683179, 7.6243381791))
            Line((39.8757683179, 7.6243381791), (41.7413840025, 10.8556793321))
            Line((41.7413840025, 10.8556793321), (39.8757684302, 14.0870202908))
        make_face()
        with BuildLine():
            ThreePointArc((34.278921783, 17.318361189), (37.5102626963, 16.4525260055), (39.8757684302, 14.0870202908))
            Line((39.8757684302, 14.0870202908), (38.0101528927, 17.318361189))
            Line((38.0101528927, 17.318361189), (34.278921783, 17.318361189))
        make_face()
    extrude(amount=F3_DEPTH)


with BuildPart() as f3g:
    # F2 (on Top) → F3, piece 7 (new body)
    with BuildSketch(Plane.XY):
        with BuildLine():
            ThreePointArc((21.9199691702, -5.6913628814), (22.5655938312, -4.1326870866), (22.7858043799, -2.4600219228))
            ThreePointArc((22.7858043799, -2.4600219228), (22.5655938312, -0.7873567589), (21.9199691702, 0.7713190359))
            ThreePointArc((21.9199691702, 0.7713190359), (19.5544634364, 3.1368247506), (16.323122523, 4.0026599341))
            ThreePointArc((16.323122523, 4.0026599341), (13.0917815365, 3.1368247083), (10.7262757913, 0.7713188895))
            ThreePointArc((10.7262757913, 0.7713188895), (9.8604406661, -2.4600219165), (10.726275785, -5.6913627242))
            ThreePointArc((10.726275785, -5.6913627242), (13.091781531, -8.0568685508), (16.323122523, -8.9227037797))
            ThreePointArc((16.323122523, -8.9227037797), (19.5544634364, -8.0568685962), (21.9199691702, -5.6913628814))
        make_face()
        with Locations((16.323122523, -2.4600219228)):
            Circle(F2_R, mode=Mode.SUBTRACT)
        with BuildLine():
            ThreePointArc((16.323122523, 4.0026599341), (19.5544634364, 3.1368247506), (21.9199691702, 0.7713190359))
            Line((21.9199691702, 0.7713190359), (20.0543536328, 4.0026599341))
            Line((20.0543536328, 4.0026599341), (16.323122523, 4.0026599341))
        make_face()
        with BuildLine():
            ThreePointArc((10.7262757913, 0.7713188895), (13.0917815365, 3.1368247083), (16.323122523, 4.0026599341))
            Line((16.323122523, 4.0026599341), (12.5918914132, 4.0026599341))
            Line((12.5918914132, 4.0026599341), (10.7262757913, 0.7713188895))
        make_face()
        with BuildLine():
            ThreePointArc((10.726275785, -5.6913627242), (9.8604406661, -2.4600219165), (10.7262757913, 0.7713188895))
            Line((10.7262757913, 0.7713188895), (8.8606603035, -2.4600219228))
            Line((8.8606603035, -2.4600219228), (10.726275785, -5.6913627242))
        make_face()
        with BuildLine():
            Line((12.5918914132, -8.9227037797), (16.323122523, -8.9227037797))
            ThreePointArc((16.323122523, -8.9227037797), (13.091781531, -8.0568685508), (10.726275785, -5.6913627242))
            Line((10.726275785, -5.6913627242), (12.5918914132, -8.9227037797))
        make_face()
        with BuildLine():
            Line((20.0543536328, -8.9227037797), (21.9199691702, -5.6913628814))
            ThreePointArc((21.9199691702, -5.6913628814), (19.5544634364, -8.0568685962), (16.323122523, -8.9227037797))
            Line((16.323122523, -8.9227037797), (20.0543536328, -8.9227037797))
        make_face()
        with BuildLine():
            ThreePointArc((21.9199691702, 0.7713190359), (22.5655938312, -0.7873567589), (22.7858043799, -2.4600219228))
            ThreePointArc((22.7858043799, -2.4600219228), (22.5655938312, -4.1326870866), (21.9199691702, -5.6913628814))
            Line((21.9199691702, -5.6913628814), (23.7855847425, -2.4600219228))
            Line((23.7855847425, -2.4600219228), (21.9199691702, 0.7713190359))
        make_face()
    extrude(amount=F3_DEPTH)


with BuildPart() as f3h:
    # F2 (on Top) → F3, piece 8 (new body)
    with BuildSketch(Plane.XY):
        with BuildLine():
            ThreePointArc((39.6502988347, -7.5949055529), (40.2959235886, -6.0362296619), (40.5161341698, -4.3635643769))
            ThreePointArc((40.5161341698, -4.3635643769), (40.295923592, -2.6908991046), (39.6502988479, -1.1322232238))
            ThreePointArc((39.6502988479, -1.1322232238), (37.2847931291, 1.2332823526), (34.0534523129, 2.09911748))
            ThreePointArc((34.0534523129, 2.09911748), (30.8221112909, 1.2332822337), (28.4566055403, -1.1322236356))
            ThreePointArc((28.4566055403, -1.1322236356), (27.5907704561, -4.3635645024), (28.4566056657, -7.5949053355))
            ThreePointArc((28.4566056657, -7.5949053355), (30.8221113996, -9.9604110502), (34.0534523129, -10.8262462338))
            ThreePointArc((34.0534523129, -10.8262462338), (37.2847931176, -9.960411113), (39.6502988347, -7.5949055529))
        make_face()
        with Locations((34.0534523129, -4.3635643769)):
            Circle(F2_R, mode=Mode.SUBTRACT)
        with BuildLine():
            ThreePointArc((34.0534523129, 2.09911748), (37.2847931291, 1.2332823526), (39.6502988479, -1.1322232238))
            Line((39.6502988479, -1.1322232238), (37.7846834227, 2.09911748))
            Line((37.7846834227, 2.09911748), (34.0534523129, 2.09911748))
        make_face()
        with BuildLine():
            ThreePointArc((39.6502988479, -1.1322232238), (40.295923592, -2.6908991046), (40.5161341698, -4.3635643769))
            ThreePointArc((40.5161341698, -4.3635643769), (40.2959235886, -6.0362296619), (39.6502988347, -7.5949055529))
            Line((39.6502988347, -7.5949055529), (41.5159145325, -4.3635643769))
            Line((41.5159145325, -4.3635643769), (39.6502988479, -1.1322232238))
        make_face()
        with BuildLine():
            Line((37.7846834227, -10.8262462338), (39.6502988347, -7.5949055529))
            ThreePointArc((39.6502988347, -7.5949055529), (37.2847931176, -9.960411113), (34.0534523129, -10.8262462338))
            Line((34.0534523129, -10.8262462338), (37.7846834227, -10.8262462338))
        make_face()
        with BuildLine():
            Line((30.3222212032, -10.8262462338), (34.0534523129, -10.8262462338))
            ThreePointArc((34.0534523129, -10.8262462338), (30.8221113996, -9.9604110502), (28.4566056657, -7.5949053355))
            Line((28.4566056657, -7.5949053355), (30.3222212032, -10.8262462338))
        make_face()
        with BuildLine():
            ThreePointArc((28.4566056657, -7.5949053355), (27.5907704561, -4.3635645024), (28.4566055403, -1.1322236356))
            Line((28.4566055403, -1.1322236356), (26.5909900934, -4.3635643769))
            Line((26.5909900934, -4.3635643769), (28.4566056657, -7.5949053355))
        make_face()
        with BuildLine():
            ThreePointArc((28.4566055403, -1.1322236356), (30.8221112909, 1.2332822337), (34.0534523129, 2.09911748))
            Line((34.0534523129, 2.09911748), (30.3222212032, 2.09911748))
            Line((30.3222212032, 2.09911748), (28.4566055403, -1.1322236356))
        make_face()
    extrude(amount=F3_DEPTH)


solid = Compound([f1.part, f1b.part, f1c.part, f1d.part, f3.part, f3b.part, f3c.part, f3d.part, f3e.part, f3f.part, f3g.part, f3h.part])
